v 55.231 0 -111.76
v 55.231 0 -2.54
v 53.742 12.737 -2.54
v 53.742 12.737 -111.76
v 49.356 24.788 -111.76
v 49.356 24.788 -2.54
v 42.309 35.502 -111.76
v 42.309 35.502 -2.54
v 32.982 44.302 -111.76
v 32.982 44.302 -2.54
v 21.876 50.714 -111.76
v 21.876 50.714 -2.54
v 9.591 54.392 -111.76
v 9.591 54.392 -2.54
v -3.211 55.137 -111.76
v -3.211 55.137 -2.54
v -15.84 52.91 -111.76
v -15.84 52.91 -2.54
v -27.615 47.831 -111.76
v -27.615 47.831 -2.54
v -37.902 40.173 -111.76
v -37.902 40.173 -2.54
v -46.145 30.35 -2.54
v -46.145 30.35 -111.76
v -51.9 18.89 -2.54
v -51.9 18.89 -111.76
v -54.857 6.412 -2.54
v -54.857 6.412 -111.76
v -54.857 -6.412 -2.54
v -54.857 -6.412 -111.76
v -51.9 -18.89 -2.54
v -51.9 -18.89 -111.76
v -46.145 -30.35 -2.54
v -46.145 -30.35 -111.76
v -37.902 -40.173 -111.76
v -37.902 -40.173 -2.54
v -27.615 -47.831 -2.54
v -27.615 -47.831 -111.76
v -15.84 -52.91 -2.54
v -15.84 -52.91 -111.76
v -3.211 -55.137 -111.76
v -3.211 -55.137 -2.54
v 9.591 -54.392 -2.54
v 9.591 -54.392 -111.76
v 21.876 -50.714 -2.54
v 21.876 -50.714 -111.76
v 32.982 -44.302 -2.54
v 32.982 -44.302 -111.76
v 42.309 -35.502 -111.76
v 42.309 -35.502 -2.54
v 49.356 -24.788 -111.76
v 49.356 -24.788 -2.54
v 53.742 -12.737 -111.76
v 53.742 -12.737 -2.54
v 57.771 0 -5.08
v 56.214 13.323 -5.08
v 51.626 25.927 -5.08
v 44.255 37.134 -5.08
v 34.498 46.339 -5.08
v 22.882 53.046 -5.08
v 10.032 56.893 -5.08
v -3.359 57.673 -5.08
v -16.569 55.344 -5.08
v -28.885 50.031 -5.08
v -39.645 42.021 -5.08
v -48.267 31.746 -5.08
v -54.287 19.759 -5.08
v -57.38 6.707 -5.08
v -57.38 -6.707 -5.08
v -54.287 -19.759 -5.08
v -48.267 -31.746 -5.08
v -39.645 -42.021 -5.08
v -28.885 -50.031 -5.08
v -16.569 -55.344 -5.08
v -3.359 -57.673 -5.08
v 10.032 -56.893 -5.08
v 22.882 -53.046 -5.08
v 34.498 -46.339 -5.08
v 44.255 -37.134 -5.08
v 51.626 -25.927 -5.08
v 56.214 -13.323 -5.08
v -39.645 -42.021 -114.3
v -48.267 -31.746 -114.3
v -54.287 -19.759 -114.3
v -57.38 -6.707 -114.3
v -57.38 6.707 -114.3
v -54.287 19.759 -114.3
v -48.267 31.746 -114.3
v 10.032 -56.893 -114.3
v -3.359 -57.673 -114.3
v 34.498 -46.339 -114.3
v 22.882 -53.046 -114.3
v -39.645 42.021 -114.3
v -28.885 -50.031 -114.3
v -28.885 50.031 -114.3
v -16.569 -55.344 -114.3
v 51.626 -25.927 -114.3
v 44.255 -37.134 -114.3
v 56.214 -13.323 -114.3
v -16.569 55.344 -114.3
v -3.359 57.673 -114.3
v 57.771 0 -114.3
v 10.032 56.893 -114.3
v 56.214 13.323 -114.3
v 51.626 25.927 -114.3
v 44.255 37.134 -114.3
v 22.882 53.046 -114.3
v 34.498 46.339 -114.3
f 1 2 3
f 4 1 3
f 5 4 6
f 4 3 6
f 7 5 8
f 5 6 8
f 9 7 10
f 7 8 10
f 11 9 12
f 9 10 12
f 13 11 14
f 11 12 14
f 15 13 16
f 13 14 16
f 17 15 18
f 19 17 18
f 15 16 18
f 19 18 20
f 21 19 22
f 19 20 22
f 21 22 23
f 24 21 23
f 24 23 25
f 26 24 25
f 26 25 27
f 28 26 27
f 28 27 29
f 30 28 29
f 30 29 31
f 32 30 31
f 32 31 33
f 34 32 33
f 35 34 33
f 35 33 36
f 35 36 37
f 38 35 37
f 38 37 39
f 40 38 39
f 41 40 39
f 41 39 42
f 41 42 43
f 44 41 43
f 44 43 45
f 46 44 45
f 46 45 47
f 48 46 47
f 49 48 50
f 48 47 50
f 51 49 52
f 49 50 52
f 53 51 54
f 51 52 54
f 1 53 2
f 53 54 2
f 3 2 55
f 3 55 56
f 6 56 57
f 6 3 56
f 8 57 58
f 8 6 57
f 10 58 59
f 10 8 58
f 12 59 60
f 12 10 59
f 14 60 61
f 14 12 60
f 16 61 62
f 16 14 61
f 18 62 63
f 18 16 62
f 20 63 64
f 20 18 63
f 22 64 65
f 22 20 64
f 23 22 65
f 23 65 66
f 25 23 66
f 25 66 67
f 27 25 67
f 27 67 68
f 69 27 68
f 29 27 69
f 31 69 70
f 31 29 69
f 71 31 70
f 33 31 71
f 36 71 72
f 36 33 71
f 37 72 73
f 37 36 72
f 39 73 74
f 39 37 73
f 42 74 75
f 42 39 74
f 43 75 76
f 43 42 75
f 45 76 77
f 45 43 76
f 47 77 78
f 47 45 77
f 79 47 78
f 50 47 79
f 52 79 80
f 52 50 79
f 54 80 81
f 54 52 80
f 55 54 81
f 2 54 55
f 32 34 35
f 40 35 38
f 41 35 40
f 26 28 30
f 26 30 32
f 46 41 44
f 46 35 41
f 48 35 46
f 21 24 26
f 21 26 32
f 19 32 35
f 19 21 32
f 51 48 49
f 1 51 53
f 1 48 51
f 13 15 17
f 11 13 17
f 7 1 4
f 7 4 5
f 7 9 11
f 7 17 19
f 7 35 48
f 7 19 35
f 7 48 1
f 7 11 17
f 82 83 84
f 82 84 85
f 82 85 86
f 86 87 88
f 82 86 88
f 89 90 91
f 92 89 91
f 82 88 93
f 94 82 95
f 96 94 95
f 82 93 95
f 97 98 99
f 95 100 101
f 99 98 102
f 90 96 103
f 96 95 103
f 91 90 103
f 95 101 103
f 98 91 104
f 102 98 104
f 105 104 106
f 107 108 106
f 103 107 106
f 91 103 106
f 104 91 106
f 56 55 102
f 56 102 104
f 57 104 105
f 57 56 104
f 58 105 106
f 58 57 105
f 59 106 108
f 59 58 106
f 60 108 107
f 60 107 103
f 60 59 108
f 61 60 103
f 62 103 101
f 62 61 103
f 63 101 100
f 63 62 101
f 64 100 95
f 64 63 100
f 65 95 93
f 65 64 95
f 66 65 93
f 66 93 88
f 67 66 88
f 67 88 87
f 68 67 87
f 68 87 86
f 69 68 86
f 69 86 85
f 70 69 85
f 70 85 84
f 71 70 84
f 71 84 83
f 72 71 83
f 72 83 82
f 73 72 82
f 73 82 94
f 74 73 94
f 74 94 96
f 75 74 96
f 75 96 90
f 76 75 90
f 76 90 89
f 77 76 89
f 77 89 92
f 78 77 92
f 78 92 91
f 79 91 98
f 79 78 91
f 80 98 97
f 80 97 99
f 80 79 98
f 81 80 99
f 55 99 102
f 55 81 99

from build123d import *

# Parameters (mm, degrees)
F0_R     = 57.7707410697
F1_DEPTH = 114.3
F2_T     = -2.54


# Not quite as in the source:
# - a fillet or chamfer that OpenCascade refuses, or shapes differently, is made with other operations: its cross-section is extruded or revolved along the edge and cut away or added
# - the program builds the solid bodies; features that only make, move or delete a surface that nothing else refers to are left out


with BuildPart() as f1:
    # F0 (on Top) → F1 (new body)
    with BuildSketch(Plane.XY):
        Circle(F0_R)
    extrude(amount=-F1_DEPTH)

    # F2
    f2_openings = [f1.faces().sort_by_distance(p)[0] for p in [
        (0, 0, 0),
    ]]
    offset(amount=F2_T, openings=f2_openings)

    # F3: chamfer of 5.08 on 1 edges, made by hand

    # F3_s1 → F3_t2 (revolve, cut)
    with BuildSketch(Plane.XZ):
        Polygon((57.7707410697, -5.08), (52.6907410697, 0), (57.7707410697, 0), align=None)
    revolve(axis=Axis((0, 0, 0), (0, 0, 1)), mode=Mode.SUBTRACT)


solid = f1.part
